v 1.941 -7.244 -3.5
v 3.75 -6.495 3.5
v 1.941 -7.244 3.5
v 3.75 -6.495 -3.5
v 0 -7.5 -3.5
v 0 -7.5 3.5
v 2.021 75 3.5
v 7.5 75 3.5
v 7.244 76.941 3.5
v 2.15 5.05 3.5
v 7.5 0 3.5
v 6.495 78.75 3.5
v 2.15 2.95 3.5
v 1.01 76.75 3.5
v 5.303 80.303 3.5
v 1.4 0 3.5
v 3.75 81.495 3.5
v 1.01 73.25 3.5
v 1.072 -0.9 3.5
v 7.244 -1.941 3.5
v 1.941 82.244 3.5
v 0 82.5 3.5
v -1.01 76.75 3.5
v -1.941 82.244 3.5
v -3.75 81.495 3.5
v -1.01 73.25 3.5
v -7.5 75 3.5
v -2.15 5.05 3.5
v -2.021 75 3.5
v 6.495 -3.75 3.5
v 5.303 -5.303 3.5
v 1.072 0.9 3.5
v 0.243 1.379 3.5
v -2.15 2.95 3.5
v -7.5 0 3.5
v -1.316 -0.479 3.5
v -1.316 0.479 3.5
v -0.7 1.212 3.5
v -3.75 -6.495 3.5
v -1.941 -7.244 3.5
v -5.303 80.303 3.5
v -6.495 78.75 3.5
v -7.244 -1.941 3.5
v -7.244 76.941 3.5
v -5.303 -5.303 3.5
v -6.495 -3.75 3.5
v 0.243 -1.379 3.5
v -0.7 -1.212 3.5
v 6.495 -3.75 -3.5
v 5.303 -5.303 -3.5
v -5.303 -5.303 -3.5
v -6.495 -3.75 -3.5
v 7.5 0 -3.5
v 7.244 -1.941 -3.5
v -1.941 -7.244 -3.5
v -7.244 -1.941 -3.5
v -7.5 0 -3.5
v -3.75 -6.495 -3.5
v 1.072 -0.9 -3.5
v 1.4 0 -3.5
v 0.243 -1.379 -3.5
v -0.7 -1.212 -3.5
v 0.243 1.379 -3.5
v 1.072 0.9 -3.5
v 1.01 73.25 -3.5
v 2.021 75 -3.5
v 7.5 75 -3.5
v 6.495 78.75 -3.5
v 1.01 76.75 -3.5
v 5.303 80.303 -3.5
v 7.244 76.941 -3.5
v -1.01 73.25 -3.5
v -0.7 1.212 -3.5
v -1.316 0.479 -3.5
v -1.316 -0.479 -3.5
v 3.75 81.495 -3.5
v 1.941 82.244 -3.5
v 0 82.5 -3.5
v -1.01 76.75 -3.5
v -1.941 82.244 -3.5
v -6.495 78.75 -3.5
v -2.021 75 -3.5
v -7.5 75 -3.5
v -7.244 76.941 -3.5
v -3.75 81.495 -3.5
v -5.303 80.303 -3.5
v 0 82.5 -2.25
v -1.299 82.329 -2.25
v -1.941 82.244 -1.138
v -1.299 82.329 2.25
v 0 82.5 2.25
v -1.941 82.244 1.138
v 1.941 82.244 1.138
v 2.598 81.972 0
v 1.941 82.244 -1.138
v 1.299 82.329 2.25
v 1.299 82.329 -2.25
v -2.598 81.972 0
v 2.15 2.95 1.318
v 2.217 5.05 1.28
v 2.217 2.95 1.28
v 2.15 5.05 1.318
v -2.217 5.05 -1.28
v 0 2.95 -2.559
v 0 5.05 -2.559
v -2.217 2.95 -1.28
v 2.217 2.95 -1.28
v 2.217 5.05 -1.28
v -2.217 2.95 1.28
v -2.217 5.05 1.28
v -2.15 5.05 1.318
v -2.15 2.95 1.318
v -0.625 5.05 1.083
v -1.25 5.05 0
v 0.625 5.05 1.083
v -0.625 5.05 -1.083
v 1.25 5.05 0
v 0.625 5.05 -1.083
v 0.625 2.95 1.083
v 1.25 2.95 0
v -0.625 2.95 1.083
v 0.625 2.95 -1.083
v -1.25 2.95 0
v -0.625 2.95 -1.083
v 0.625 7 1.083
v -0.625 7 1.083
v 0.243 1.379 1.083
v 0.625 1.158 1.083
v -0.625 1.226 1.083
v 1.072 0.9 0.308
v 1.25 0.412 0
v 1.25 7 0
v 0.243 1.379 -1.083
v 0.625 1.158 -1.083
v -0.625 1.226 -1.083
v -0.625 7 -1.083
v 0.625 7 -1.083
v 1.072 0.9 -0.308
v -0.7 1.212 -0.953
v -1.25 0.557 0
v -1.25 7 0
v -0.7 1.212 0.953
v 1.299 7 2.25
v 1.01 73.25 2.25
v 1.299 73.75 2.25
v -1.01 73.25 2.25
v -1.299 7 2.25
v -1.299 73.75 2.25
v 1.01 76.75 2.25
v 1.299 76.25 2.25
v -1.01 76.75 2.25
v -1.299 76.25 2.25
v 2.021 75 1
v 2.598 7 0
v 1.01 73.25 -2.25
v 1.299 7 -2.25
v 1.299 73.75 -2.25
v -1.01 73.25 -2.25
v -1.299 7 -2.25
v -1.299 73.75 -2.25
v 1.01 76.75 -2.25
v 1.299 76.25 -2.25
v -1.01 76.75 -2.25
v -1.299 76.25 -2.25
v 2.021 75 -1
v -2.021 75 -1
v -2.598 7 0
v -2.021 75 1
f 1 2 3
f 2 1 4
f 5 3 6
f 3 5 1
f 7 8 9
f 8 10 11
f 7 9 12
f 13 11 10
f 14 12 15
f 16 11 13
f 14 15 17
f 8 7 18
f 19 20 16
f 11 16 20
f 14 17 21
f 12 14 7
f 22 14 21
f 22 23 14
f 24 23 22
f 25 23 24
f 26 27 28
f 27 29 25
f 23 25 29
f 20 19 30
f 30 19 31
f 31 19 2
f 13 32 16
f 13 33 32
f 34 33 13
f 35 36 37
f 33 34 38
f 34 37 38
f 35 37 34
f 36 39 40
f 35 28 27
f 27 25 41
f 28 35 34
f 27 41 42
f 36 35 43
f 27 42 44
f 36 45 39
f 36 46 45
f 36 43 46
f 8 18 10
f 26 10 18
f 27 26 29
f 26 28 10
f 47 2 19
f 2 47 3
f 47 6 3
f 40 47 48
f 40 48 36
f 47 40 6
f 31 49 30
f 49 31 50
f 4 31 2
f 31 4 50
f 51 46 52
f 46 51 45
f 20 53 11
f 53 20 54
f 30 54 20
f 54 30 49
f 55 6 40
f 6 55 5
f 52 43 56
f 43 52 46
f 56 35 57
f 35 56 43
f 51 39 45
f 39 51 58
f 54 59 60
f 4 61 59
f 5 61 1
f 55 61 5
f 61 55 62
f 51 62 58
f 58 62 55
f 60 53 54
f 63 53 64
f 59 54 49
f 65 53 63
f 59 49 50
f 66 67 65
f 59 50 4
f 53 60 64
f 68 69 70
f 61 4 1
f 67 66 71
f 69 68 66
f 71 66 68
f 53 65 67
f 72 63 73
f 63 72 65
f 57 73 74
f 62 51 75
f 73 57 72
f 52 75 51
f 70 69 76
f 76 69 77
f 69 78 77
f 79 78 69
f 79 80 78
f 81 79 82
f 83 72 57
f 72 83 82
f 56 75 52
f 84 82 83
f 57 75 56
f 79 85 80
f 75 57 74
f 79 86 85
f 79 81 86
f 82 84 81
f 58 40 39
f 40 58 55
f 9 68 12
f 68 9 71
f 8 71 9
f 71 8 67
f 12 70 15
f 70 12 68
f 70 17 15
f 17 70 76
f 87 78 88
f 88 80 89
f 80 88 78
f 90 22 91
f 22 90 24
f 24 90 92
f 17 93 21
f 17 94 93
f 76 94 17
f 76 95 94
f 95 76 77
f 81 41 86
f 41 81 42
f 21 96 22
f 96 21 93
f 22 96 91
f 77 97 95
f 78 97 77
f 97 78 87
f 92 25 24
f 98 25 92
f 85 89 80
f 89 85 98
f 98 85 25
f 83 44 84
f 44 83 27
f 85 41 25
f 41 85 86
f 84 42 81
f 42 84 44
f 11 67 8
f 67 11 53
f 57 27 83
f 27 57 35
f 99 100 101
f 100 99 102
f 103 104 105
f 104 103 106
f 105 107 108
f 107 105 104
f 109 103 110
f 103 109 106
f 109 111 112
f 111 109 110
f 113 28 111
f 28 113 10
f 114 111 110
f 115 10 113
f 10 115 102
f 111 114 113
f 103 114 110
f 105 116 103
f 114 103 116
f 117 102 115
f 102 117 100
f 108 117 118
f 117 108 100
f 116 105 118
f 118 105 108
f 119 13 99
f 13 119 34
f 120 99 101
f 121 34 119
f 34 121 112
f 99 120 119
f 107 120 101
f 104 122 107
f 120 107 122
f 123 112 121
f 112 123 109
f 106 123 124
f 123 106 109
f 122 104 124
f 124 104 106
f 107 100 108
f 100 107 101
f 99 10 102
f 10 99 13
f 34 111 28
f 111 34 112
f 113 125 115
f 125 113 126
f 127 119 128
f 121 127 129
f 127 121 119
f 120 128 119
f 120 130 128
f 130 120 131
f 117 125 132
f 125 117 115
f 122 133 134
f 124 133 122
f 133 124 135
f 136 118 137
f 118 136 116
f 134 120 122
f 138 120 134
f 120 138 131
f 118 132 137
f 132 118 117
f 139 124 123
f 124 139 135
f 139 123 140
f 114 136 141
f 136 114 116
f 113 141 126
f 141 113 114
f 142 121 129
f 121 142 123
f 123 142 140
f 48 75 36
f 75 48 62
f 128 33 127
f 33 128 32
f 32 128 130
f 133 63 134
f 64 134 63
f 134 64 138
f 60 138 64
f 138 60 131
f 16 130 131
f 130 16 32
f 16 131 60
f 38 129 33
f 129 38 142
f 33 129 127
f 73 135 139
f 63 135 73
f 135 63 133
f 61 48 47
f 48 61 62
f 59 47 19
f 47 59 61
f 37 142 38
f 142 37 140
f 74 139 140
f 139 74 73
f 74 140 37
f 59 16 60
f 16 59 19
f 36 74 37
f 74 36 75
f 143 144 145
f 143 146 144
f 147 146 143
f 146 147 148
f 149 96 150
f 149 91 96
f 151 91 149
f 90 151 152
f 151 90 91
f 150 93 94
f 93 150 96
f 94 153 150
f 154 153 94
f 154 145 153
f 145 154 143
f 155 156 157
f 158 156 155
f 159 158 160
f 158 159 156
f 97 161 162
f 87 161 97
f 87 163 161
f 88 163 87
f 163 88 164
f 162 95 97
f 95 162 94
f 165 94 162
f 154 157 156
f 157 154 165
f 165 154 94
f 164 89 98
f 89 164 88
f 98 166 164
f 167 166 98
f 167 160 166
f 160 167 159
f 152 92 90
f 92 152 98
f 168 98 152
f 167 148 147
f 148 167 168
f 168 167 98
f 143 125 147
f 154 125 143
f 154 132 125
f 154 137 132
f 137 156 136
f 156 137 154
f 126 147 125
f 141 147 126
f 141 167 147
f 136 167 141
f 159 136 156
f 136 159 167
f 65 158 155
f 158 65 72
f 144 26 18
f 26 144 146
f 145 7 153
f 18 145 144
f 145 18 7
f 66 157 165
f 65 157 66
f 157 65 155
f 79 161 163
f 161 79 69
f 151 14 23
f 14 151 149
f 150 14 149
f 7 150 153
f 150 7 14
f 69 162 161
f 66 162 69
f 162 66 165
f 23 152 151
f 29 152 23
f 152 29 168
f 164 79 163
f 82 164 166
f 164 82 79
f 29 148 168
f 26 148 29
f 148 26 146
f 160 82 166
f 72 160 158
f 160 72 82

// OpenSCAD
// file: common.scad
//include <RatsoShapeLibrary.scad>



/*
Define settings for each nut/bolt type here
*/

// ### layer height of the printer ###
printer_layer_height = 0.4;

// kludge factor for different print nozzles
printer_oversize = 0.5; // 0.35 nozzle use 0.3; 0.6 nozzle use 0.?
printer_oversizeArc = 0.2; // 0.35 nozzle = ???; 0.6 nozzle = 0.2


// ### M3 ###

M3_boltDiameter = 3.0 + printer_oversize; // actual 3.0
M3_boltDiameterArc = 3.0 + printer_oversizeArc; // used for rotary extruded bolt channel
M3_boltHeadDiameter = 6.0 + printer_oversize; // actual 6
M3_nutHeight = 2.4 + printer_oversize; // actual 2.4
M3_lockNutHeight = 4.0 + printer_oversize; // actual 4.0
M3_nutDiameterMin = 5.5 + printer_oversize; // actual 5.5
M3_nutDiameterMax = (5.5*(1/sin(60))) + printer_oversize; // actual 6
M3_nutDiameterArc = 5.5; // used for rotary extruded nut channel

// eventually standardize this interface??, that would allow for easy switching of bolt/nut sizes
M3_dim = [M3_boltDiameter,M3_nutDiameterMin,M3_nutDiameterMax,M3_nutHeight];


// ### M2 ###

M2_boltDiameter = 2.0 + printer_oversize; // actual 2.0
M2_boltHeadDiameter = 4.0 + printer_oversize; // actual 4
M2_nutHeight = 1.6 + printer_oversize; // actual 1.6
M2_nutDiameterMin = 3.8 + printer_oversize; // actual 4
M2_nutDiameterMax = (4.0*(1/sin(60))) + printer_oversize; // actual 4.5

// eventually standardize this interface??, that would allow for easy switching of bolt/nut sizes
M2_dim = [M2_boltDiameter,M2_nutDiameterMin,M2_nutDiameterMax,M2_nutHeight];

// ### M8 ###
M8_rodDiameter = 8 + printer_oversize;

// ### PI ###
pi = 3.14159265359;



// ### shaft sizes for tight fit ###
woodDowel_quarterInch_diameter = 7.1;
woodDowel_halfInch_diameter = 13.5;
stepperMotor_diameter = 5.0 + printer_oversize; // actual 5.0



//--------




// =========================================================

//trapNutDie(channelHeight=20, holeLength=50, holeOffset=15 );
//trapNutDie(channelHeight=0 ,holeLength=15, holeOffset=0, nutOffset=0 );
// ** this is a brand-new function
module trapNutDie(
	channelHeight=15, 
	holeLength=10, 
	holeOffset=0, 
	nutOffset=0, 
	boltHoleRes=12,
	boltRadius = M3_boltDiameter/2, // DEPRICATE
	mType = 0,
	boltDiameter = M3_boltDiameter,
	nutHeight = M3_nutHeight,
	nutDiameterMin = M3_nutDiameterMin,
	nutDiameterMax = M3_nutDiameterMax,
	horizontal = false // should add a support to the bolt hole, AND (###TODO###) make the nut height a little higher
	){

	if(!horizontal){
		// hex-hole for the nut
		translate([0,-(nutHeight/2),-nutOffset]) rotate([-90,30,0]) cylinder(r=nutDiameterMax/2, h=nutHeight, $fn=6);
		// channel the nut drops into
		translate([-nutDiameterMin/2,-(nutHeight/2),0]) cube([nutDiameterMin,nutHeight,channelHeight]);
	}else{
		// hex-hole for the nut
		translate([0,-(nutHeight/2),-nutOffset]) rotate([-90,30,0]) cylinder(r=nutDiameterMax/2, h=nutHeight+printer_layer_height, $fn=6);
		// channel the nut drops into
		translate([-nutDiameterMin/2,-(nutHeight/2),0]) cube([nutDiameterMin,nutHeight+printer_layer_height,channelHeight]);
	}

	difference(){
		// bolt hole
		translate([0,-(holeLength/2)+holeOffset,0]) rotate([-90,0,0]) cylinder(r=boltDiameter/2, h=holeLength, $fn=boltHoleRes);
		if(horizontal){
			// cutout slice for support (if horizontal)
			rotate([-90,0,0]) translate([0,0,(nutHeight/2)+0.001]) cylinder(r=(boltDiameter/2)+1, h=printer_layer_height*2);
		}
	}
	
}

// =================================

//stumpWithTrapNut(shaftDiameter=stepperMotor_diameter, stumpWallThick=6, nutBlockThick=12);
//stumpWithTrapNut(shaftDiameter=16 + printer_oversize ); // shaft collar for Chad's drum stand
//stumpWithTrapNut(shaftDiameter=woodDowel_halfInch_diameter, stumpWallThick=8, nutBlockThick=0);
//stumpWithTrapNut(shaftDiameter=woodDowel_quarterInch_diameter); // shaftDiameter was 7.3, but a little too loose


module stumpWithTrapNut(
	shaftDiameter = 7.3,
	stumpWallThick = 4,
	nutBlockThick = 8,
	){

	shaftRadius = shaftDiameter/2;
	stumpRadius = shaftRadius + stumpWallThick;
	stumpHeight = 10;

	nutBlockWidth = M3_nutDiameterMax+stumpWallThick;
	nutBlockOffsetY = stumpRadius + nutBlockThick - stumpWallThick;
	stumpTrapNutOffsetY = shaftRadius + ( max( stumpWallThick, nutBlockThick ) / 2.5 );  //nutBlockOffsetY - (nutBlockThick/2); //
	stumpTrapNutOffsetZ = stumpHeight/2;

	trapNutBoltHoleLength = max( nutBlockThick, stumpWallThick );

		// nut stump
			translate([0,0,0]) difference(){
				union(){
					// stump
					translate([0,0,0]) cylinder(r=stumpRadius, h=stumpHeight, center=false);
					// nut block
					translate([-nutBlockWidth/2,-nutBlockOffsetY,0]) cube([nutBlockWidth,nutBlockThick,stumpHeight]);
				}
				// motor shaft
				translate([0,0,(stumpHeight)/2]) cylinder(r=shaftRadius, h=stumpHeight+1, center=true, $fn=shaftDiameter*3);
				// trap nut
				rotate([0,0,0]) translate([0,-stumpTrapNutOffsetY, stumpHeight-stumpTrapNutOffsetZ]) rotate([0,0,0]) trapNutDie(channelHeight=10 ,holeLength=trapNutBoltHoleLength*2, holeOffset=(-trapNutBoltHoleLength)/2 ); //holeOffset=(length/2)+(r1/2)
			} // translate difference
}
// main file
include<common.scad>
include <RatsoShapeLibrary.scad>


// ========================================================

// Main function calls. Build things here.


// the basic body, for both types
//buzzBotBody();
//buzzBotBodyNoBattery();
//buzzBotBody_clipHackCover();

// parts for BuzzBot mini
// DELETE - buzzBotMiniLeg();
//simpleLeg( [5,50,3], 7); // default for BuzzBot mini
//simpleLeg( [8,100,8], 8); // default for BuzzBot big

// ** change these NOT just mini **
//buzzBotMiniWireBlockFoot();
//buzzBotMiniWireBlockFoot(wireType="bristle", buzzBotLegsThick = 8 );
//buzzBotMiniShaftWeight();

// parts for BuzzBot big
//buzzBotBigShaftWeight(length=50);
//buzzBotBigShaftWeight(length=100);
buzzBotBigShaftWeight(length=75);



// these simple elements are called by the other main types

//rotate([0,30,0]) trapNutDie(channelHeight=0 ,holeLength=20, holeOffset=0, nutOffset=0 );
//batteryHolderCase();
//simpleMotorCase();
//wireLockBlock();
//wireLockBlock(wireType="bristle");
//switchCase();


// connector for dowels
//rodClamp()


// ========================================================



// body wall thickness gets used in a bunch of calculations below
bodyWallThick = 1.5;
bodyFloorThick = bodyWallThick*2;

// -------------------------------------
// Battery settings

// these first three need to change depending on battery type
batteryDiameter = 15; // AAA:actual 10.5,use 11, AA: actual 14.5, use 15
batteryLength = 50.5; // AAA: actual 44.5, AA=50.5;  
batteryTerminalWidth = 11; // AAA=9, AA=11; width and height same

// this is for using one of the manufactured battery holders
batteryHolder_AA_1X = [ 17, 57 ];
batteryHolder_AA_2X = [ 31.9, 56.8 ];
batteryHolder_AA_4X = [ 63.5, 58 ];
batteryHolderSize = batteryHolder_AA_2X; // 1x=[ 17, 57 ], 2x=[ 31.9, 56.8 ], 4x=[ 63.5, 58 ]different than the 1x, why?

batteryHolderBoltInset_AA_1X = [ 2.5, 5 ];
batteryHolderBoltInset_AA_2X = [ 13.5, 5.5 ];
batteryHolderBoltInset_AA_4X = [ 3, 29 ];
batteryHolderBoltInset = batteryHolderBoltInset_AA_2X; // 1x=[2.5,5], 4x=[3,center]

batteryHolderWallHeight = 3;

// these stay the same 
batteryTerminalThick = 1.0; // was 1.6, thickness including bent tab, same for AAA/AA
batteryTerminalTabWidth = 3.5; // was 3.5
batteryTerminalTabThick = 1.5; // was 1.6
batteryTerminalTabRatio = 0.3; // where the triangle split occurs
batteryTerminalOpeningWidth = 9; // AAA  7; AA 9
batteryTerminalSlopeMaxWidth = (batteryTerminalWidth+batteryDiameter)/2; // max width of the area  where the terminals begin to slope

// calculate the size of the battery case
batteryCaseSizeOuter = [ 
	batteryHolderSize[0]+(bodyWallThick*2), 
	bodyWallThick+batteryHolderSize[1]+bodyWallThick, 
	batteryHolderWallHeight+bodyFloorThick
];
// the cutout for the battery
batteryCutoutSize = [ 
	batteryHolderSize[0], 
	batteryHolderSize[1], 
	batteryHolderWallHeight+1
];




// -------------------------------------
// Motor settings

// these change depending on the motor
motorBodyDiameter = 19.5; // pager: actual 7.0, use 6.9; hobby: actual 20, use ?
motorBodyLength = 20; // pager: 15 (long), 10 (short); hobby: 25, height 15
motorTopPadding = -5; // pager: 1; hobby: -6? - can be used to solve the non-round hobby motor issue (diameter != height)

// the bumps that help hold the motor in
motorHoldingRailsRadius = 3; // pager 2; hobby 3
motorHoldingRailsOffset = 1.5; // pager 1.5; hobby 2
motorHoldingRailsZoffset = 0.5;

// 
motorRearPadding = 10; 
motorRearNarrow = 10;
motorRearSideCut = 1;
motorSideWallThick = bodyWallThick * 2;
motorBottomWallThick = bodyFloorThick;

motorCaseSizeOuterNoHead = [ 
	(motorBodyDiameter)+(motorSideWallThick*2), 
	bodyWallThick+motorRearPadding+motorBodyLength, 
	(motorBodyDiameter+motorTopPadding)+(motorBottomWallThick*1)
];

motorCutoutSize = [ 
	motorBodyDiameter, 
	motorBodyLength+1, 
	motorBodyDiameter+motorTopPadding+1 
];


// -------------------------------------
// the switch

switchSize = [15,8,15];
switchScrewPlateWidth = 4;
switchScrewSpace = 19;
switchScrewDiameter = M2_boltDiameter;
switchScrewNutHeight = 4;
switchScrewNutZOffset = 5; // from top
switchScrewHoleDepth = 13; // from top
switchCaseSizeOuter = [ switchSize[0]+(bodyWallThick*2)+(switchScrewPlateWidth*2), switchSize[1], switchSize[2]+bodyFloorThick ];



// -------------------------------------
// the overall body
// 
buzzBotBodySizeOuter = [ 
	batteryCaseSizeOuter[0], 
	batteryCaseSizeOuter[1]+switchCaseSizeOuter[1]+motorCaseSizeOuterNoHead[1], 
	batteryCaseSizeOuter[2] 
];

//buzzBotMountSize = [ 10, 4, 30 ];
buzzBotMountTabHoleSpacing = 30;
buzzBotMountTabHolePadding = 5;
buzzBotMountTabSize = [ buzzBotMountTabHoleSpacing+(buzzBotMountTabHolePadding*2), (buzzBotMountTabHolePadding*2), 6 ];
buzzBotMountTabOffsetY = [0,0]; // [front,rear] from end
buzzBotMountTabMinSpacing = 35; // minimum distance between mounts (to allow room for rodClamp), TODO - should be distance between bolt holes



// -------------------------------------
// small, clip-on shaft weight for pager motor
// 
shaftWeightIR = 3.40; // motor diam is 7, was 3.53
shaftWeightTailLength = 10;
//
shaftWeightWallThick = 1.5;
//shaftWeightBaseThick = 0.0;
shaftWeightLength = 3; // the thickness of the weight
shaftWeightOR = shaftWeightIR + shaftWeightWallThick; // shaftWeightIR + shaftWeightWallThick;
shaftWeightCutOffset = 1.5; // from center
shaftWeightTailThick = 10;
shaftWeightTailRingIR = M3_boltDiameter; // for extra weight
shaftWeightRes = 45;
shaftWeightClipCut = 1;





// -------------------------------------
// other items


// "wire" here means wire leg
wireDiameter = 2.7;
wireLockBlockSize = [10,11,10];
wireLockBlockOffsetY = 27; // from center
wireLockBlockOffsetX = 10; // from edge
wireLockBlockNutOffsetZ = 0; // to center the nut over the bolt hole
wireBlockFootTabLength = buzzBotMountTabHoleSpacing + 15;
wireHoleOffsetY =8;
trapNutOffsetY = 3.5;
streetSweeperBristleSize = [4.0, 1.2]; // [width,thickness], actual [3.2,0.6]


// "wire" here means ground wire
groundWireRadius = 1.3;
groundWireHoleOffsetX = -1; // from center
groundWireHoleOffsetZ = -0.5;
groundWireBlockSize = [ 3.5, 3, 2.5 ];
groundWireBlockOffsets = [bodyWallThick+batteryTerminalThick,(batteryCaseSizeOuter[1])/2,batteryCaseSizeOuter[1]-groundWireBlockSize[1]-5];
groundWireChannelWidth = batteryTerminalThick; 
groundWireChannelHeight = 4;
hasGroundWireChannels = false;


//$fs=1;


// ========================================================






module buzzBotBigShaftWeight(
	shaftDiameter = 2.8, // actual 2
	width = 7.5,
	length = 20,
	height = 7,
	// use new M type framework in common
	trapNutOffset = 4,
	boltHeadHoleOffset = 3 // from trapNut
	){

	r1 = width;
	r2 = width;

	difference(){
		// main body
		translate([0,0,-(height/2)]) cam(r1,r2,length,height);
		// shaft hole
		cylinder(r=shaftDiameter/2,h=height+1,center=true, $fs=1);
		// trap nut 
		translate([0,trapNutOffset,0]) trapNutDie(boltDiameter = M2_boltDiameter, nutHeight = M2_nutHeight, nutDiameterMin = M2_nutDiameterMin, nutDiameterMax = M2_nutDiameterMax, holeLength=length+(r1*2), holeOffset=(length/2)+(r1/2), boltHoleRes=6 );

		// recessed hole for bolt head
		translate([0,trapNutOffset+boltHeadHoleOffset,0]) rotate([-90,0,0]) cylinder( r=(M2_boltHeadDiameter/2)*(1/sin(60)), h=length+width, center=false, $fn=6 );

		// hole for attaching more weight
		translate([0,length,0]) cylinder(r=(M3_boltDiameter/2)*(1/sin(60)),h=height+1, center=true, $fn=6);
	}
	
}


// -------------------------------------------------------------------------

//simpleMotorCase();

module simpleMotorCase(){
	difference(){
		union(){
			difference(){
			
				// outer cube
				cube(motorCaseSizeOuterNoHead);
				
				// cutout for motor
				translate([ 
					motorSideWallThick, 
					bodyWallThick, 
					motorBottomWallThick]) {

					//motorRearPadding
					translate([ (motorCutoutSize[0]-motorRearNarrow)/2, 0, 0 ]) trapazoid( motorRearNarrow, motorCutoutSize[0], motorRearPadding+0.001, motorCutoutSize[2] );
					// cutout for motor
					translate([ 0, motorRearPadding, 0 ]) cube(motorCutoutSize);

				} // translate
				
			} // difference
		
			// add bumps to keep the motor in place
			// bump
			translate([ motorSideWallThick, bodyWallThick+motorRearPadding, motorBottomWallThick+(motorCutoutSize[2]-1)-motorHoldingRailsRadius+motorHoldingRailsZoffset ]) difference(){
					translate([-motorHoldingRailsOffset,0,0]) rotate([ -90, 0, 0 ]) cylinder(r=motorHoldingRailsRadius, h=motorCutoutSize[1]-1);
					// cube to cutoff
					translate([ -0.001, -1, -motorHoldingRailsRadius ]) mirror([1,0,0]) cube([ motorHoldingRailsRadius*2, motorCutoutSize[1]+2, (motorHoldingRailsRadius*2)+2 ]);
			}// bump 
			translate([ motorSideWallThick+motorCutoutSize[0], bodyWallThick+motorRearPadding, motorBottomWallThick+(motorCutoutSize[2]-1)-motorHoldingRailsRadius+motorHoldingRailsZoffset ]) mirror([1,0,0]) difference(){
					translate([-motorHoldingRailsOffset,0,0]) rotate([ -90, 0, 0 ]) cylinder(r=motorHoldingRailsRadius, h=motorCutoutSize[1]-1);
					// cube to cutoff
					translate([ -0.001, -1, -motorHoldingRailsRadius ]) mirror([1,0,0]) cube([ motorHoldingRailsRadius*2, motorCutoutSize[1]+2, (motorHoldingRailsRadius*2)+2 ]);
			}
			
		}// union - for the bumps
		
		// cuts for allowing the sides to flex out
		translate([ -1, motorCaseSizeOuterNoHead[1]-motorBodyLength-0.001, motorBottomWallThick]) cube([motorCaseSizeOuterNoHead[0]+2, motorRearSideCut, motorCaseSizeOuterNoHead[2]+1 ]);

		//cutout between motor and positive terminal, motorRearNarrow
		translate([ (motorCaseSizeOuterNoHead[0]-motorRearNarrow)/2, -1, motorBottomWallThick ]) cube([ motorRearNarrow, (bodyWallThick*2)+0.002, motorCutoutSize[2]]);

	}// difference - for the rear side cutout

}

// -------------------------------------------------------------------------
//batteryHolderCase();
module batteryHolderCase(
	boltHoleDiameter = M2_boltDiameter
	){
	
	difference(){
		// outer cube
		//echo("batteryCaseSizeOuter",batteryCaseSizeOuter);
		cube(batteryCaseSizeOuter);
		// cutout for battery
		translate([bodyWallThick,bodyWallThick,bodyFloorThick+0.001]) cube(batteryCutoutSize);
		// bolt holes
		translate([ bodyWallThick+batteryHolderBoltInset[0], bodyWallThick+batteryHolderBoltInset[1], -1 ]) cylinder( r=boltHoleDiameter/2, h=bodyFloorThick+2, $fn=boltHoleDiameter*3 );
		translate([ batteryCaseSizeOuter[0]-bodyWallThick-batteryHolderBoltInset[0], batteryCaseSizeOuter[1]-bodyWallThick-batteryHolderBoltInset[1], -1 ]) cylinder( r=boltHoleDiameter/2, h=bodyFloorThick+2, $fn=boltHoleDiameter*3 );

	}
}


// -------------------------------------------------------------------------
// NOTE: I tried to define all the variables here as properties, but... then when I make the body, I need to know the size of the thing to use it in a model. So now I want to make all the variables globals at the top... but then I'm back to that system. hmmm.


module switchCase(
	//switchSize = [16,8,12], // z is from bottom of screw plate ('cause it hangs from that)
	screwPlateWidth = switchScrewPlateWidth, // the metal plate that hangs off the side for mounting
	screwDiameter = switchScrewDiameter,
	wallThick = bodyWallThick,
	floorThick = bodyFloorThick
	){

	caseSize = switchCaseSizeOuter;// [ switchSize[0]+(wallThick*2)+(screwPlateWidth*2), switchSize[1], switchSize[2]+floorThick ];
	custoutSize = [ switchSize[0], switchSize[1]+2, switchSize[2]+1 ];

	//
	difference(){
		// outer case
		cube(caseSize);
		// cutout for switch
		translate([screwPlateWidth+wallThick,-1,floorThick]) cube(custoutSize);

		// screw hole and nut
		translate([ (caseSize[0]/2)-(switchScrewSpace/2), caseSize[1]/2, caseSize[2]-switchScrewNutZOffset ]) cylinder(r=(M2_boltDiameter/2)*.8, h=switchScrewHoleDepth, $fn=M2_boltDiameter*4, center=true ); //rotate([90,0,90]) trapNutDie(channelHeight=caseSize[0]/2, holeLength=switchScrewHoleDepth+0.001, boltDiameter = M2_boltDiameter, nutHeight = M2_nutHeight, nutDiameterMin = M2_nutDiameterMin, nutDiameterMax = M2_nutDiameterMax, horizontal=true);

		translate([ (caseSize[0]/2)+(switchScrewSpace/2), caseSize[1]/2, caseSize[2]-switchScrewNutZOffset ]) cylinder(r=(M2_boltDiameter/2)*.8, h=switchScrewHoleDepth, $fn=M2_boltDiameter*4, center=true ); //rotate([90,0,-90]) trapNutDie(channelHeight=caseSize[0]/2, holeLength=switchScrewHoleDepth+0.001, boltDiameter = M2_boltDiameter, nutHeight = M2_nutHeight, nutDiameterMin = M2_nutDiameterMin, nutDiameterMax = M2_nutDiameterMax, horizontal=true);

	}		
}




// -------------------------------------------------------------------------

// BuzzBot

//buzzBotBody();

module buzzBotBody(){

	tabFrontOffsetX = max( buzzBotMountTabMinSpacing/2, motorCaseSizeOuterNoHead[0]/2 ); // tabFrontOffsetX || buzzBotMountTabMinSpacing
	tabRearOffsetX = max( buzzBotMountTabMinSpacing/2, buzzBotBodySizeOuter[0]/2 ); // tabFrontOffsetX || buzzBotMountTabMinSpacing

	tabFrontFillInBehindGap=tabFrontOffsetX-(motorCaseSizeOuterNoHead[0]/2)+0.001;
	tabRearFillInBehindGap=tabRearOffsetX-(buzzBotBodySizeOuter[0]/2)+0.001;

	difference(){
		union(){
			// battery holder
			batteryHolderCase();
			// switch
			translate([ (batteryCaseSizeOuter[0]-switchCaseSizeOuter[0])/2, batteryCaseSizeOuter[1], 0 ]) switchCase();
			// motor
			translate([ (batteryCaseSizeOuter[0]-motorCaseSizeOuterNoHead[0])/2, batteryCaseSizeOuter[1]+switchCaseSizeOuter[1],0]) simpleMotorCase();
			
				// mount tab left rear
				translate([ 
					(buzzBotBodySizeOuter[0]/2)-tabRearOffsetX-buzzBotMountTabSize[1]+0.001, 
					buzzBotMountTabSize[0]+buzzBotMountTabOffsetY[1],
					0]) rotate([0,0,-90]) buzzBotTabMount( fillInBehindGap=tabRearFillInBehindGap );
				
				// mount tab left front
				translate([
					(buzzBotBodySizeOuter[0]/2)-tabFrontOffsetX-buzzBotMountTabSize[1]+0.001, 
					buzzBotBodySizeOuter[1]-buzzBotMountTabOffsetY[0], 
					0]) rotate([0,0,-90]) buzzBotTabMount( fillInBehindGap=tabFrontFillInBehindGap );

				// mount tab right rear
				translate([ 
					(buzzBotBodySizeOuter[0]/2)+tabRearOffsetX+buzzBotMountTabSize[1]-0.001,
					buzzBotMountTabSize[0]+buzzBotMountTabOffsetY[1],
					0]) rotate([0,0,-90]) mirror([0,1,0]) buzzBotTabMount( fillInBehindGap=tabRearFillInBehindGap );

				// mount tab right front
				translate([
					(buzzBotBodySizeOuter[0]/2)+tabFrontOffsetX+buzzBotMountTabSize[1]-0.001, 
					buzzBotBodySizeOuter[1]-buzzBotMountTabOffsetY[0], 
					0]) rotate([0,0,-90]) mirror([0,1,0]) buzzBotTabMount( fillInBehindGap=tabFrontFillInBehindGap );

				// tail
				translate([(batteryCaseSizeOuter[0]-buzzBotMountTabSize[0])/2,-buzzBotMountTabSize[1]+0.001,0]) rotate([0,0,0]) buzzBotTabMount();
			
		} // union
	

	} // difference
}

// -------------------------------------------------------------------------

//buzzBotBodyNoBattery();

module buzzBotBodyNoBattery(){

	tabFrontOffsetX = max( buzzBotMountTabMinSpacing/2, motorCaseSizeOuterNoHead[0]/2 ); // tabFrontOffsetX || buzzBotMountTabMinSpacing
	tabRearOffsetX = max( buzzBotMountTabMinSpacing/2, buzzBotBodySizeOuter[0]/2 ); // tabFrontOffsetX || buzzBotMountTabMinSpacing

	tabFrontFillInBehindGap=tabFrontOffsetX-(motorCaseSizeOuterNoHead[0]/2)+0.001;
	tabRearFillInBehindGap=tabRearOffsetX-(buzzBotBodySizeOuter[0]/2)+0.001;

	tailTabSpacing = buzzBotMountTabMinSpacing/2;

	difference(){
		union(){
			// battery holder
			//batteryHolderCase();
			// switch
			translate([ (batteryCaseSizeOuter[0]-switchCaseSizeOuter[0])/2, tailTabSpacing, 0 ]) switchCase();
			// motor
			translate([ (batteryCaseSizeOuter[0]-motorCaseSizeOuterNoHead[0])/2, tailTabSpacing+switchCaseSizeOuter[1],0]) simpleMotorCase();
			
				
				// mount tab left front
				translate([
					(buzzBotBodySizeOuter[0]/2)-tabFrontOffsetX-buzzBotMountTabSize[1]+0.001, 
					tailTabSpacing, 
					0]) rotate([0,0,-90]) mirror([1,0,0]) buzzBotTabMount( fillInBehindGap=tabFrontFillInBehindGap );


				// mount tab right front
				translate([
					(buzzBotBodySizeOuter[0]/2)+tabFrontOffsetX+buzzBotMountTabSize[1]-0.001, 
					tailTabSpacing, 
					0]) rotate([0,0,90]) mirror([0,0,0]) buzzBotTabMount( fillInBehindGap=tabFrontFillInBehindGap );

				// tail
				translate([(batteryCaseSizeOuter[0]-buzzBotMountTabSize[0])/2,-buzzBotMountTabSize[1]+0.001,0]) rotate([0,0,0]) buzzBotTabMount( fillInBehindGap=tailTabSpacing);
			
		} // union
	


		//translate([clipHackCaseTranslateTo[0],clipHackCaseTranslateTo[1]-0.001,clipHackCaseTranslateTo[2]-1])roundRectangle([clipHack_outerWidth,clipHack_outerDepth,buzzBotMountTabSize[2]+2], caseCornerRounding );
		//
		translate([(batteryCaseSizeOuter[0]/2),clipHack_boltOffset,-1]) cylinder(r=clipHack_boltCutoutDiameter/2, h=buzzBotMountTabSize[2]+2);

	} // difference

	//
		// the rca jack 
		translate(clipHackCaseTranslateTo) difference() {
			scale(1) import("peripherals v2 - clipHack - case.stl");
		// cutoff back
		translate([-1,clipHack_chopOffset,0]) cube([clipHack_outerWidth+2,clipHack_outerDepth,clipHack_outerHeight]);
	}

}

clipHack_outerWidth = 14;
clipHack_outerDepth = 21;
clipHack_outerHeight = 15;
clipHack_chopOffset = 22;
clipHack_boltOffset = 6.5;
clipHack_boltCutoutDiameter = M3_nutDiameterMax+2;
caseCornerRounding = 3;
clipHackCaseTranslateTo = [(batteryCaseSizeOuter[0]/2)-(clipHack_outerWidth/2), -(buzzBotMountTabSize[1]), buzzBotMountTabSize[2]-0.001]; // caution: clipHack cannot go so low as to raise the floor (else the RCA jack won't fit)



module buzzBotBody_clipHackCover(){
	difference(){
		scale(1) import("peripherals v2 - clipHack - cover.stl");
		translate([-1,clipHack_chopOffset,-1]) cube([clipHack_outerWidth+2,clipHack_outerDepth,clipHack_outerHeight]);
	}
}



// -------------------------------------------------------------------------


module buzzBotTabMount( 
	fillInBehindGap=0
	){
	//
	//buzzBotMountTabSize
	translate([ 0, 0, 0 ]) {
		difference(){
			// tab body
			rotate([0,0,0]) cube( [buzzBotMountTabSize[0],buzzBotMountTabSize[1]+fillInBehindGap,buzzBotMountTabSize[2]] );
			// hole
			translate([ (buzzBotMountTabSize[1]/2), (buzzBotMountTabSize[1]/2), buzzBotMountTabSize[2] ]) rotate([ 90,0,0 ]) rotate([0,30,0]) trapNutDie(channelHeight=0 ,holeLength=15, holeOffset=0, nutOffset=0, nutHeight=buzzBotMountTabSize[2] );
			translate([ (buzzBotMountTabSize[0])-(buzzBotMountTabSize[1]/2), (buzzBotMountTabSize[1]/2), buzzBotMountTabSize[2] ]) rotate([ 90,0,0 ]) rotate([0,30,0]) trapNutDie(channelHeight=0 ,holeLength=15, holeOffset=0, nutOffset=0, nutHeight=buzzBotMountTabSize[2] );
		}
		// add filler behind, for the motor case section (because it is more narrow)
		//translate([ 0, -(batteryCaseSizeOuter[0]-motorCaseSizeOuterNoHead[0])/2, 0 ]) cube([buzzBotMountTabSize[0], fillInBehindGap,buzzBotMountTabSize[2]]);
	}

}

// -------------------------------------------------------------------------



module simpleLeg(
	size = [5,50,3], // outer size: X,Y,Z 
	endRadius = 7 // the round end of the leg, only used if size[0] < endRadius
	){
	
	difference(){
		union(){	
			// the body 
			translate([0,0,0]) cam( size[0]/2, size[0]/2, size[1], size[2] );
			// the ends
			cylinder(r=endRadius, h=size[2]);
			translate([0,size[1],0]) cylinder(r=endRadius, h=size[2]);
		}// union
		// trap nut close end
		translate([0,0,size[2]])  rotate([90,0,0]) trapNutDie(channelHeight=0 ,holeLength=size[2]*2, holeOffset=0, nutOffset=0, nutHeight=size[2] );
		// trap nut far end
		translate([0,size[1],size[2]])  rotate([90,0,0]) trapNutDie(channelHeight=0 ,holeLength=size[2]*2, holeOffset=0, nutOffset=0, nutHeight=size[2] );
	}

}

// -------------------------------------------------------------------------








// -------------------------------------------------------------------------

module buzzBotMiniShaftWeight(){
	$fn=shaftWeightRes;
	union(){
		difference(){
			union(){
				// outer cylinder
				cylinder( r=shaftWeightOR, h=shaftWeightLength );
				// add weight/fin/whatever you call it
				 translate([ 0, -shaftWeightIR-shaftWeightTailLength+shaftWeightTailThick/2, 0 ]) cam( shaftWeightTailThick/2, shaftWeightOR, shaftWeightTailLength, shaftWeightLength ); 
			}// union
			// cutoff flat side of outer
			translate([-shaftWeightOR-1,shaftWeightCutOffset+shaftWeightWallThick,-1]) cube([(shaftWeightOR*2)+2,shaftWeightOR,shaftWeightLength+shaftWeightWallThick+2]);
			translate([0,0,-1]) difference() {
				// inner cylinder
				cylinder( r=shaftWeightIR, h=shaftWeightLength+2 );
				// cutoff flat side of inner
				translate([-shaftWeightIR*2,shaftWeightCutOffset,-1]) cube([(shaftWeightIR*4),shaftWeightIR,shaftWeightLength+4]);
			}
			// cutout to make it a clip
			translate([0,shaftWeightCutOffset-shaftWeightClipCut,-1]) cube([ shaftWeightOR+1, shaftWeightClipCut, shaftWeightLength+2 ]);

			if(shaftWeightTailRingIR>0){
			// hole
				translate([ 0, -shaftWeightTailLength+shaftWeightTailRingIR, -1 ]) cylinder( r=shaftWeightTailRingIR, h=shaftWeightLength+2 );
			}
		}// difference
	
	/*
	if(shaftWeightTailRingIR>0){
	// add hole
	translate([ 0, -shaftWeightTailLength, -1 ]) cylinder( r=shaftWeightTailRingIR, h=shaftWeightLength+2 );
	translate([ 0, -shaftWeightOR-shaftWeightTailLength-shaftWeightTailRingIR-(shaftWeightWallThick/2), 0 ]) difference(){
		// outer
		cylinder( r=shaftWeightTailRingIR+shaftWeightWallThick, h=shaftWeightLength );
		// inner
		translate([ 0, 0, -1 ]) cylinder( r=shaftWeightTailRingIR, h=shaftWeightLength+2 );
	}
	}// if
	*/
	}//union


}

// -------------------------------------------------------------------------





// -------------------------------------------------------


module groundWireBlock(offsetY){
	translate([0,offsetY,0]) difference(){
		union(){
			cube(groundWireBlockSize);
			// support, rightTriangle(size[x,y,z])
			translate([0,0,0]) rotate([-90,0,0]) rightTriangle([ groundWireBlockSize[0], groundWireBlockSize[0], groundWireBlockSize[1] ]);
		}
			// hole for wire
			translate([(groundWireBlockSize[0]/2)+groundWireHoleOffsetX,-1, (groundWireBlockSize[2]/2)+groundWireHoleOffsetZ ]) rotate([-90,0,0]) cylinder(r=groundWireRadius, h=groundWireBlockSize[1]+2, $fn=6);
	}
}


// -------------------------------------------------------

//buzzBotBigWireBlockFoot();

module buzzBotBigWireBlockFoot(
	wireType="bristle",
	buzzBotLegsThick = 4,
	mountBoltSpacing = 25, // make match the rod clamp
	mountTabLength = 40
	){
	
	mountTabCenter = wireLockBlockSize[1] + (mountTabLength/2);

	difference(){
		union(){
			// mount tab
			translate([-(wireLockBlockSize[0]/2),wireLockBlockSize[1]-0.001,0]) cube([wireLockBlockSize[0],mountTabLength+0.001,buzzBotLegsThick]);
			//  block
			translate([-(wireLockBlockSize[0]/2),0,0]) mirror([0,0,0]) wireLockBlock(wireType=wireType);
		} // union
		
		// trap nut
		translate([ 0, mountTabCenter-(mountBoltSpacing/2),buzzBotLegsThick-(M3_nutHeight/3)+0.001 ]) rotate([ 90,0,0 ]) rotate([0,0,0]) trapNutDie(channelHeight=0 ,holeLength=15, holeOffset=0, nutOffset=0 );
		translate([ 0, mountTabCenter+(mountBoltSpacing/2),buzzBotLegsThick-(M3_nutHeight/3)+0.001 ]) rotate([ 90,0,0 ]) rotate([0,0,0]) trapNutDie(channelHeight=0 ,holeLength=15, holeOffset=0, nutOffset=0 );

	} // difference
}


// -------------------------------------------------------


module buzzBotMiniWireBlockFoot(
	wireType="wire",
	buzzBotLegsThick = 6
	){
	difference(){
		union(){
			// cube leading up to block
			translate([-(wireLockBlockSize[0]/2),0,0]) cube([wireLockBlockSize[0],wireBlockFootTabLength+0.001,buzzBotLegsThick]);
			//  block
			translate([-(wireLockBlockSize[0]/2),wireLockBlockSize[1]+wireBlockFootTabLength,0]) mirror([0,1,0]) wireLockBlock(wireType=wireType);
		} // union
		
		// trap nut
		translate([ 0, (wireBlockFootTabLength/2)-(buzzBotMountTabHoleSpacing/2),buzzBotLegsThick-(M2_nutHeight/2)+0.001 ]) rotate([ 90,0,0 ]) rotate([0,0,0]) trapNutDie(channelHeight=0 ,holeLength=15, holeOffset=0, nutOffset=0 );
		translate([ 0, (wireBlockFootTabLength/2)+(buzzBotMountTabHoleSpacing/2),buzzBotLegsThick-(M2_nutHeight/2)+0.001 ]) rotate([ 90,0,0 ]) rotate([0,0,0]) trapNutDie(channelHeight=0 ,holeLength=15, holeOffset=0, nutOffset=0 );

	} // difference
}

// wireBlockFootTabLength, buzzBotMountTabHoleSpacing

// -------------------------------------------------------------------------
module wireLockBlock( 
	wireRad=wireDiameter/2, 
	boltRad=boltDiameter/2,
	wireType = "wire",
	bristleSize= streetSweeperBristleSize
	){

	bristleHoleSize = [ bristleSize[0], bristleSize[1], wireLockBlockSize[2]+1 ];

	difference(){
		cube(wireLockBlockSize);
		// wire hole vert
		translate([ wireLockBlockSize[0]/2, wireHoleOffsetY, wireLockBlockSize[2]/2 ])  rotate([0,0,0]) {
			if(wireType=="bristle"){
				cube(bristleHoleSize, center=true);
			}else{
				cylinder(r=wireRad, h=wireLockBlockSize[2]+2, center=true,$fn=6);
			}
		}
		// wire hole horz
		translate([wireLockBlockSize[0]/2, wireHoleOffsetY, wireLockBlockSize[2]/2 ]) rotate([0,90,0]) {
			if(wireType=="bristle"){
				cube(bristleHoleSize, center=true);
			}else{
				rotate([0,0,30]) cylinder(r=wireRad, h=wireLockBlockSize[2]+2, center=true,$fn=6);
			}
		}
		// trap nut
		translate([ wireLockBlockSize[0]/2, trapNutOffsetY, wireLockBlockSize[2]/2 ]) trapNutDie(channelHeight=wireLockBlockSize[2], holeOffset=-1, holeLength=11, nutOffset=wireLockBlockNutOffsetZ);
	} // difference

}
